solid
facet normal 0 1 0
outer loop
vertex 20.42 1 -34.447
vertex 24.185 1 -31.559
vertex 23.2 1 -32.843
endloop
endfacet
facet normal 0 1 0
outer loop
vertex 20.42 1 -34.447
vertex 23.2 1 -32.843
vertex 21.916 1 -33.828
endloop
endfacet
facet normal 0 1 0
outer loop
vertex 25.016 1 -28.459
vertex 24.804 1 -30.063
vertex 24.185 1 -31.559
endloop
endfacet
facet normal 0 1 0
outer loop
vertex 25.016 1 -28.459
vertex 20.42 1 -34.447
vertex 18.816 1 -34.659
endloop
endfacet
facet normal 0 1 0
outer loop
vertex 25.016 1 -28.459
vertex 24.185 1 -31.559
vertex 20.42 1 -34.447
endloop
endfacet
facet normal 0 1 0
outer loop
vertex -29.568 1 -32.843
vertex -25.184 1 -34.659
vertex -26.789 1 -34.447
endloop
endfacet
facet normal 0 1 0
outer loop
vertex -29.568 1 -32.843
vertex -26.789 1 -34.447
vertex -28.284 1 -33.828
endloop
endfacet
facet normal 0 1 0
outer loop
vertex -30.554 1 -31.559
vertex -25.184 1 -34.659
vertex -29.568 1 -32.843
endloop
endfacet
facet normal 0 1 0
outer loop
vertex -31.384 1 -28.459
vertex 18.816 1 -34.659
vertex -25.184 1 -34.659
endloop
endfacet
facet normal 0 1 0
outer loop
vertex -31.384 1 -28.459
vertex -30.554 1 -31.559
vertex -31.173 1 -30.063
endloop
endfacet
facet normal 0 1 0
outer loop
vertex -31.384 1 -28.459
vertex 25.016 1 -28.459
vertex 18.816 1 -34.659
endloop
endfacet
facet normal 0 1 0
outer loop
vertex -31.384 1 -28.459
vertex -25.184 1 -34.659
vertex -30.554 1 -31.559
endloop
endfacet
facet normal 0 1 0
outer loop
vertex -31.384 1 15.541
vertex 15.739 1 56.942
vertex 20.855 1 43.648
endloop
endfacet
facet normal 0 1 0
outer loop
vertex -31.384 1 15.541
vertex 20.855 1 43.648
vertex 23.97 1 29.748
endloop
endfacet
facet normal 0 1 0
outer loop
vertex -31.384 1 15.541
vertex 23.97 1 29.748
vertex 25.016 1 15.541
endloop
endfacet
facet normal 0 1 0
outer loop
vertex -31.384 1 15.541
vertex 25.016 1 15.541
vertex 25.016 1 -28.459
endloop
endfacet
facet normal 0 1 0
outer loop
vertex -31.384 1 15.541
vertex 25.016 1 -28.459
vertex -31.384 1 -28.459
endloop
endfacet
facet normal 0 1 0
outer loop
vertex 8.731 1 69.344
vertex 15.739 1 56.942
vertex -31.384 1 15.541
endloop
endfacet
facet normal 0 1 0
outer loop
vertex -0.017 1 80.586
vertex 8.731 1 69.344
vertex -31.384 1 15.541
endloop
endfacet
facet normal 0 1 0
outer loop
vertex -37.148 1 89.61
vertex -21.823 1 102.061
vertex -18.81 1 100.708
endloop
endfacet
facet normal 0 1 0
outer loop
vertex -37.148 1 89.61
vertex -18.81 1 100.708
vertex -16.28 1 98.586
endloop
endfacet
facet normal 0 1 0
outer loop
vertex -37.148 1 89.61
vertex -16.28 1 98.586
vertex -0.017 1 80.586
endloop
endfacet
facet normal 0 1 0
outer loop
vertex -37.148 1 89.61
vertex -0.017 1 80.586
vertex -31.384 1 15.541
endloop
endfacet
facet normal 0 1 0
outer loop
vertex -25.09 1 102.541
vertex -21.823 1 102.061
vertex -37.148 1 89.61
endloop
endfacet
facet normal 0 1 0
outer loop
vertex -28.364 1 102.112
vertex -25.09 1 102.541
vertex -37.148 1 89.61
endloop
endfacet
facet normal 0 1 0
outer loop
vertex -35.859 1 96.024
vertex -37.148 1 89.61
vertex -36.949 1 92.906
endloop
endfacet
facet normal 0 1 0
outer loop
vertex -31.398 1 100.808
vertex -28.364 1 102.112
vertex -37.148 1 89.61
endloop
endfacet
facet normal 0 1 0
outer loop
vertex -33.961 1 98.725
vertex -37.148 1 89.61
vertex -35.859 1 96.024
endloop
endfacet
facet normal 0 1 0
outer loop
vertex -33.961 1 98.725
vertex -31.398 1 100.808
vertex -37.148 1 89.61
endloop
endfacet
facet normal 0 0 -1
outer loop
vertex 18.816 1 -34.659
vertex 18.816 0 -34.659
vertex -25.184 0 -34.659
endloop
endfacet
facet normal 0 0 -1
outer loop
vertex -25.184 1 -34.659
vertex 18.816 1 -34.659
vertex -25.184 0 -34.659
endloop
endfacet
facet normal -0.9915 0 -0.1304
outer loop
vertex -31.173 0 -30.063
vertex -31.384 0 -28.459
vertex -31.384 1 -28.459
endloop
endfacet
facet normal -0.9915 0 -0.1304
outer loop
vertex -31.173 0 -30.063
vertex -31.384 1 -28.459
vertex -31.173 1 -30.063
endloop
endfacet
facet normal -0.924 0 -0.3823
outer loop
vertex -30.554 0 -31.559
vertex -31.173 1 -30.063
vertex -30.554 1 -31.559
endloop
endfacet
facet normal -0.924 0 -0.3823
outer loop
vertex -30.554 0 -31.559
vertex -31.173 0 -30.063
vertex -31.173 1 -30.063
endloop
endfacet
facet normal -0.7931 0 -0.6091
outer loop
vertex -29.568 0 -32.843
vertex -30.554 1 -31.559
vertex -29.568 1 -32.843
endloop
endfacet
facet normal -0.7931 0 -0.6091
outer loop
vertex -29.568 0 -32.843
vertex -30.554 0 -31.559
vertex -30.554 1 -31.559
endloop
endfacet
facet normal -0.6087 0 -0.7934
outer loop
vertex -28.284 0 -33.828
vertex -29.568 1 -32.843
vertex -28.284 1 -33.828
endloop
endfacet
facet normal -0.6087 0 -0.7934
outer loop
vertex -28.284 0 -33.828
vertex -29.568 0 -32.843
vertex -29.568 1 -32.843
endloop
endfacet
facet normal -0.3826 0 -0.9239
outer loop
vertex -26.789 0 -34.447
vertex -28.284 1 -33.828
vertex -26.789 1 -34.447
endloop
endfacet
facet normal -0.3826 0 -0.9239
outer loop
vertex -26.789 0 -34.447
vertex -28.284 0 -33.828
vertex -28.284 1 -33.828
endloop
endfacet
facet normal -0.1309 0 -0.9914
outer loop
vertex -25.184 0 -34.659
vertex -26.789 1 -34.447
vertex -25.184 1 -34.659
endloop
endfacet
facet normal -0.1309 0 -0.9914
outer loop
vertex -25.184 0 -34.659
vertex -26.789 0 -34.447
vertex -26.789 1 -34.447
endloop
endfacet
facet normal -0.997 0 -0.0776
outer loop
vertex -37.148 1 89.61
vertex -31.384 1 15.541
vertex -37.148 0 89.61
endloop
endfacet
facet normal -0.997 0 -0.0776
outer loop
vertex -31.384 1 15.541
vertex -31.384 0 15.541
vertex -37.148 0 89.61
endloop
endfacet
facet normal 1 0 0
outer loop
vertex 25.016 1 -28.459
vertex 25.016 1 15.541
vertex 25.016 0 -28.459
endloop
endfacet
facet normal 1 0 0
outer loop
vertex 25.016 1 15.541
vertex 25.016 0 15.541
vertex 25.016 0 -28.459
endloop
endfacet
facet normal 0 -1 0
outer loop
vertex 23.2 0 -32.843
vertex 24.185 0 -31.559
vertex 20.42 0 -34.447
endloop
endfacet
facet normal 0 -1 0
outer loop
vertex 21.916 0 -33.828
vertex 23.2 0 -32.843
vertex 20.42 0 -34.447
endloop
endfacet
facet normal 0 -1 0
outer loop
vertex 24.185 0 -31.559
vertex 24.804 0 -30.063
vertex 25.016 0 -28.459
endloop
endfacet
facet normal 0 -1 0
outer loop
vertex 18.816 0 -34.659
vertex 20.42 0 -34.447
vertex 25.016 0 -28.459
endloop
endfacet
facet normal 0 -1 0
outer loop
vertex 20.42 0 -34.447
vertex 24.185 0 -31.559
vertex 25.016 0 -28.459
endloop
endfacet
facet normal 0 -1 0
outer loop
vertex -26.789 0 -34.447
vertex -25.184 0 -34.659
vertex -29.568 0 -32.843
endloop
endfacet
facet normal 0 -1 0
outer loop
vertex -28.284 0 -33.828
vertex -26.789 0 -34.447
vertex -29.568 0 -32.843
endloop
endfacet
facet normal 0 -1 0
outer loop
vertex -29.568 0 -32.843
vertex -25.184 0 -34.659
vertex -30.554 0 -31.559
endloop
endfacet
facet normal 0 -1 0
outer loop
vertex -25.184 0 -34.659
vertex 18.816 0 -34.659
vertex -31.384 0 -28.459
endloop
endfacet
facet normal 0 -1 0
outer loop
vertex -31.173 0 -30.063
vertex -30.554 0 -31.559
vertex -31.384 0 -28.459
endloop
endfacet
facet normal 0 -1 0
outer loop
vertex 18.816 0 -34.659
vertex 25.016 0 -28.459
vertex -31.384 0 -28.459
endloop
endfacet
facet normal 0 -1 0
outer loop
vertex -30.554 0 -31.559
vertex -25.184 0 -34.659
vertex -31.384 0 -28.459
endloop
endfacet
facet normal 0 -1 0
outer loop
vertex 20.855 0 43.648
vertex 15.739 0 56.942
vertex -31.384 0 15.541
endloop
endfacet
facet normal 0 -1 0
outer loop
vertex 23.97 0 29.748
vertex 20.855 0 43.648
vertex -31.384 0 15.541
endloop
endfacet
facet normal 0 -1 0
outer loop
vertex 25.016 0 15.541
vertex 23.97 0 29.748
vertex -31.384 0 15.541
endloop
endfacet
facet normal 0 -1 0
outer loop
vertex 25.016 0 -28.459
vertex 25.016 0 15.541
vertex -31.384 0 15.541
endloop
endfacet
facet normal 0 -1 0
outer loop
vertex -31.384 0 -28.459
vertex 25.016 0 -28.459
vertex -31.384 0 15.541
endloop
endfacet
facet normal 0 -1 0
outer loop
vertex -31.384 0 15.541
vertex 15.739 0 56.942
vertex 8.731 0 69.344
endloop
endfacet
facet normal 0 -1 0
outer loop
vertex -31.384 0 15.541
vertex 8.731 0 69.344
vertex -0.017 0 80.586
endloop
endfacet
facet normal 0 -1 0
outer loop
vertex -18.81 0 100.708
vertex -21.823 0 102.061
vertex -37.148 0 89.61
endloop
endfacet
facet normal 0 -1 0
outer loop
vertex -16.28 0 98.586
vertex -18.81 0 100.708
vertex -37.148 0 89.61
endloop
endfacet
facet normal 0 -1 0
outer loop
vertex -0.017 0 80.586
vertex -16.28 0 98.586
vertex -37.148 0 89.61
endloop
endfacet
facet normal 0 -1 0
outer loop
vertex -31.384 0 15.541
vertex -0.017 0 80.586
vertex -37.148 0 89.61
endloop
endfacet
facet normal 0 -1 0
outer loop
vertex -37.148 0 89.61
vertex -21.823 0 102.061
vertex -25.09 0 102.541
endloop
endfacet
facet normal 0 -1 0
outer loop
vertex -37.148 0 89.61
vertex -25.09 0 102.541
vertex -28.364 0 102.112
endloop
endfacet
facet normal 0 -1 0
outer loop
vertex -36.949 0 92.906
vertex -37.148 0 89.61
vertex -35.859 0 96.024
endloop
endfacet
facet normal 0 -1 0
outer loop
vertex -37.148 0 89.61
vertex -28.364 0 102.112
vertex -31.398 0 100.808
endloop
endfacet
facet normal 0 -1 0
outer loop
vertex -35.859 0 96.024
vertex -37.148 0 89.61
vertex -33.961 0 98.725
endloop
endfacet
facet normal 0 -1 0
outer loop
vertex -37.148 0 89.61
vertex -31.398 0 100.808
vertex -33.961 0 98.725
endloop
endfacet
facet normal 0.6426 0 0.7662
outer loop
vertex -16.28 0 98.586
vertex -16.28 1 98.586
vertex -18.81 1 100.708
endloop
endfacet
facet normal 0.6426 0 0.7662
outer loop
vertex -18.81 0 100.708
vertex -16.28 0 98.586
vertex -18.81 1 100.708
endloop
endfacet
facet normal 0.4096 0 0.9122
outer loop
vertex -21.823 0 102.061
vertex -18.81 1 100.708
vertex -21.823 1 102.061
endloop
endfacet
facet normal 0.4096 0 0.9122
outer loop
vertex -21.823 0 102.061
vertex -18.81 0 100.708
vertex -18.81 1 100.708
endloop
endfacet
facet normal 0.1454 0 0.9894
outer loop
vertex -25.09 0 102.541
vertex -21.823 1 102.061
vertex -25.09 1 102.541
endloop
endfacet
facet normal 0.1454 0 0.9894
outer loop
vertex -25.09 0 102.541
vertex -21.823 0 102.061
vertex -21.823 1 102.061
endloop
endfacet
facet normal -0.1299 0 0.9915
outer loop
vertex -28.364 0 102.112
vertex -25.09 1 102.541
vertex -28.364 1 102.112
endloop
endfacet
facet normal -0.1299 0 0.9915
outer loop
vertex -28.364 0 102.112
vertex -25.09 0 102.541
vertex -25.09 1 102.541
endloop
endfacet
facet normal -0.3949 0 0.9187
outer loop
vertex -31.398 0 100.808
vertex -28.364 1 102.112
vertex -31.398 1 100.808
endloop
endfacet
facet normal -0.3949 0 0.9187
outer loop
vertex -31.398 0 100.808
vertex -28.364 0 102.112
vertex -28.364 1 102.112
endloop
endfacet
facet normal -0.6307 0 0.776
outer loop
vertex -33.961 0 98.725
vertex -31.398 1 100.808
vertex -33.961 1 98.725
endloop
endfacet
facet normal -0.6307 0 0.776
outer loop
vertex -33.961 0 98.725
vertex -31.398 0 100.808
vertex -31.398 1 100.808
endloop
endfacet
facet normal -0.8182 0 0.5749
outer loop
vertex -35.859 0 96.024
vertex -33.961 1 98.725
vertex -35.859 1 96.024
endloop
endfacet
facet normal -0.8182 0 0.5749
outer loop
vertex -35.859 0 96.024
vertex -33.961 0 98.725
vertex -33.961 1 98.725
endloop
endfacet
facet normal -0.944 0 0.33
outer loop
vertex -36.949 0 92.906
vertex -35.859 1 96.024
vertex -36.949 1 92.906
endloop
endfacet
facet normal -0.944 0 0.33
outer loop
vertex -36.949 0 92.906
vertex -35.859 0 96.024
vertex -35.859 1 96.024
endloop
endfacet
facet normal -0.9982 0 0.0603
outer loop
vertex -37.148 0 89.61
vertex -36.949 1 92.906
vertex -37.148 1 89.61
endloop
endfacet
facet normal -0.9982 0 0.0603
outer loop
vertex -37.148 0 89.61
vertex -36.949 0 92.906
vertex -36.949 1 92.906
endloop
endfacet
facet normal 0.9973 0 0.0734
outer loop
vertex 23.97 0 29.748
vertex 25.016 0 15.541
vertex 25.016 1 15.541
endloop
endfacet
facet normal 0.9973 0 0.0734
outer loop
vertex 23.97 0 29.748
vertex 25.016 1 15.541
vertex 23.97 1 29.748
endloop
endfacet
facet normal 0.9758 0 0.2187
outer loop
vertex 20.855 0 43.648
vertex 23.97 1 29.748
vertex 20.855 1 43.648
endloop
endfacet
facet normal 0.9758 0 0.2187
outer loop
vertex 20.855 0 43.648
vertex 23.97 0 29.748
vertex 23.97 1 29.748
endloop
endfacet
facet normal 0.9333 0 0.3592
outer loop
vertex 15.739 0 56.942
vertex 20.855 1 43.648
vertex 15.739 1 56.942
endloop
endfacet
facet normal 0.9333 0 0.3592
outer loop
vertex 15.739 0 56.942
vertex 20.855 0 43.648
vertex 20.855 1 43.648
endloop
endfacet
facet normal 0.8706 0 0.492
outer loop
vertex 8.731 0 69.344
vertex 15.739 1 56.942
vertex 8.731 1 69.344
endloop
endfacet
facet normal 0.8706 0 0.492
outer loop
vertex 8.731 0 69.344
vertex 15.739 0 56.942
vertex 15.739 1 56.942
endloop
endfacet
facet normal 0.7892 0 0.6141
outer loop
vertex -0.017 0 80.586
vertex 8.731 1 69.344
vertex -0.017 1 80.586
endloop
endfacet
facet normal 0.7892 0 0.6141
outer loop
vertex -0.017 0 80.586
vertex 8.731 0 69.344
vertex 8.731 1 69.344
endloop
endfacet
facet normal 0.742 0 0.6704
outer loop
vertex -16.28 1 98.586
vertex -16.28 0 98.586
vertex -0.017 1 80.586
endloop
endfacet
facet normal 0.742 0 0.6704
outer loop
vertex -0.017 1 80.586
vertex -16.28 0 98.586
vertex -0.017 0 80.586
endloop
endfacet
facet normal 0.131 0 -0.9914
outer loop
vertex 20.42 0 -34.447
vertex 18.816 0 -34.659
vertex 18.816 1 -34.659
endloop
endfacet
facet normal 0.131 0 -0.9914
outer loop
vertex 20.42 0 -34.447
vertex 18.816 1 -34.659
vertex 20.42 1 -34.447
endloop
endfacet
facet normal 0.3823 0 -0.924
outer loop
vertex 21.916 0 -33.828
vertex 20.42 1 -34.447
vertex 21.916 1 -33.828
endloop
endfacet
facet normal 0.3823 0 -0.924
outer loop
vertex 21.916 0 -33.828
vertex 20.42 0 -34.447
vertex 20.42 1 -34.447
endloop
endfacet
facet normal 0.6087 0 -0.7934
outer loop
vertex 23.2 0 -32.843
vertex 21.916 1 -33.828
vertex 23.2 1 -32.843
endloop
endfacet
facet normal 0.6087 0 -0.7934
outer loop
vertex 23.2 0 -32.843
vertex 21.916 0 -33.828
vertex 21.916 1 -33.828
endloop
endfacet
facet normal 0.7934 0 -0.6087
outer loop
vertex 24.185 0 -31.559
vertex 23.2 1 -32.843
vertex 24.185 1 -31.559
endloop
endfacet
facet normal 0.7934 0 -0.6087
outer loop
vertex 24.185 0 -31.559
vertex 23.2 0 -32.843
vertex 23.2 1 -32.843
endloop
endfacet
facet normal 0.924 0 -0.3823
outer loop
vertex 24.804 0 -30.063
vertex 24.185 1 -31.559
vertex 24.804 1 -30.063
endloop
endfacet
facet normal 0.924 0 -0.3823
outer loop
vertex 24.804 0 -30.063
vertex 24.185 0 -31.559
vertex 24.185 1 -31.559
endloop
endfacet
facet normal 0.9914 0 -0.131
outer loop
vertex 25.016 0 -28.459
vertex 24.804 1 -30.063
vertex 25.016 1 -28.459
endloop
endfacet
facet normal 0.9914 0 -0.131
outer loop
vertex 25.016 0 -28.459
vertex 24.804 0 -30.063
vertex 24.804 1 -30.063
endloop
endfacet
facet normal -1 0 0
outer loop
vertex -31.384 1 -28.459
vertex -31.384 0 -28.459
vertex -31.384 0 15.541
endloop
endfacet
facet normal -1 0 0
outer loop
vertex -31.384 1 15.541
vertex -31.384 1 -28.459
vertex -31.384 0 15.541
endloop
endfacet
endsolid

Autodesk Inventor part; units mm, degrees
ref_plane "YZ Plane" through (0, 0, 0) normal (1, 0, 0) x (0, 1, 0)
ref_plane "XZ Plane" through (0, 0, 0) normal (0, 1, 0) x (-1, 0, 0)
ref_plane "XY Plane" through (0, 0, 0) normal (0, 0, 1) x (1, 0, 0)
sketch "Sketch1" plane through (0, 0, 0) normal (0, 1, 0) x (-1, 0, 0)
  line L0 (50, 0) -> (-50, 0)
  line L1 (0, 50) -> (0, -50)
  line L2 (-25.0156, 15.5413) -> (-25.0156, -28.4587)
  arc A0 (-25.0156, -28.4587) -> (-18.8156, -34.6587) centre (-18.8156, -28.4587) ccw
  line L3 (-18.8156, -34.6587) -> (25.1844, -34.6587)
  arc A1 (25.1844, -34.6587) -> (31.3844, -28.4587) centre (25.1844, -28.4587) ccw
  line L4 (31.3844, -28.4587) -> (31.3844, 15.5413)
  line L5 (31.3844, 15.5413) -> (37.1483, 89.6103)
  arc A2 (37.1483, 89.6103) -> (16.2805, 98.5862) centre (25.1844, 90.5413) ccw
  line L6 (16.2805, 98.5862) -> (0.0171, 80.5862)
  arc A3 (0.0171, 80.5862) -> (-25.0156, 15.5413) centre (72.0072, 15.5413) ccw
  line L7 (31.3844, 15.5413) -> (-25.0156, 15.5413) construction
  point P0 (0, 0)
  point P1 (31.3844, 15.5413)
  dimension "d0" = 100
  dimension "d1" = 100
  dimension "d3" = 56.4
  dimension "d4" = 6.2
  dimension "case_foot_outer_radius" = 12
  dimension "case_foot_width" = 75
  dimension "d7" = 18
extrude "Extrusion1" add sketch "Sketch1" along normal blind 1
equation "\"d3\" = core_outer_width + 2 * case_spacing + 2 * case_thickness"
equation "\"d4\" = core_outer_radius + case_thickness + case_spacing"
equation "\"case_spacing\" = 0.2"
equation "\"core_outer_width\" = 54"
equation "\"case_thickness\" = 1"
equation "\"core_outer_radius\" = 5"
properties part number "m2stack_bottom_1"
